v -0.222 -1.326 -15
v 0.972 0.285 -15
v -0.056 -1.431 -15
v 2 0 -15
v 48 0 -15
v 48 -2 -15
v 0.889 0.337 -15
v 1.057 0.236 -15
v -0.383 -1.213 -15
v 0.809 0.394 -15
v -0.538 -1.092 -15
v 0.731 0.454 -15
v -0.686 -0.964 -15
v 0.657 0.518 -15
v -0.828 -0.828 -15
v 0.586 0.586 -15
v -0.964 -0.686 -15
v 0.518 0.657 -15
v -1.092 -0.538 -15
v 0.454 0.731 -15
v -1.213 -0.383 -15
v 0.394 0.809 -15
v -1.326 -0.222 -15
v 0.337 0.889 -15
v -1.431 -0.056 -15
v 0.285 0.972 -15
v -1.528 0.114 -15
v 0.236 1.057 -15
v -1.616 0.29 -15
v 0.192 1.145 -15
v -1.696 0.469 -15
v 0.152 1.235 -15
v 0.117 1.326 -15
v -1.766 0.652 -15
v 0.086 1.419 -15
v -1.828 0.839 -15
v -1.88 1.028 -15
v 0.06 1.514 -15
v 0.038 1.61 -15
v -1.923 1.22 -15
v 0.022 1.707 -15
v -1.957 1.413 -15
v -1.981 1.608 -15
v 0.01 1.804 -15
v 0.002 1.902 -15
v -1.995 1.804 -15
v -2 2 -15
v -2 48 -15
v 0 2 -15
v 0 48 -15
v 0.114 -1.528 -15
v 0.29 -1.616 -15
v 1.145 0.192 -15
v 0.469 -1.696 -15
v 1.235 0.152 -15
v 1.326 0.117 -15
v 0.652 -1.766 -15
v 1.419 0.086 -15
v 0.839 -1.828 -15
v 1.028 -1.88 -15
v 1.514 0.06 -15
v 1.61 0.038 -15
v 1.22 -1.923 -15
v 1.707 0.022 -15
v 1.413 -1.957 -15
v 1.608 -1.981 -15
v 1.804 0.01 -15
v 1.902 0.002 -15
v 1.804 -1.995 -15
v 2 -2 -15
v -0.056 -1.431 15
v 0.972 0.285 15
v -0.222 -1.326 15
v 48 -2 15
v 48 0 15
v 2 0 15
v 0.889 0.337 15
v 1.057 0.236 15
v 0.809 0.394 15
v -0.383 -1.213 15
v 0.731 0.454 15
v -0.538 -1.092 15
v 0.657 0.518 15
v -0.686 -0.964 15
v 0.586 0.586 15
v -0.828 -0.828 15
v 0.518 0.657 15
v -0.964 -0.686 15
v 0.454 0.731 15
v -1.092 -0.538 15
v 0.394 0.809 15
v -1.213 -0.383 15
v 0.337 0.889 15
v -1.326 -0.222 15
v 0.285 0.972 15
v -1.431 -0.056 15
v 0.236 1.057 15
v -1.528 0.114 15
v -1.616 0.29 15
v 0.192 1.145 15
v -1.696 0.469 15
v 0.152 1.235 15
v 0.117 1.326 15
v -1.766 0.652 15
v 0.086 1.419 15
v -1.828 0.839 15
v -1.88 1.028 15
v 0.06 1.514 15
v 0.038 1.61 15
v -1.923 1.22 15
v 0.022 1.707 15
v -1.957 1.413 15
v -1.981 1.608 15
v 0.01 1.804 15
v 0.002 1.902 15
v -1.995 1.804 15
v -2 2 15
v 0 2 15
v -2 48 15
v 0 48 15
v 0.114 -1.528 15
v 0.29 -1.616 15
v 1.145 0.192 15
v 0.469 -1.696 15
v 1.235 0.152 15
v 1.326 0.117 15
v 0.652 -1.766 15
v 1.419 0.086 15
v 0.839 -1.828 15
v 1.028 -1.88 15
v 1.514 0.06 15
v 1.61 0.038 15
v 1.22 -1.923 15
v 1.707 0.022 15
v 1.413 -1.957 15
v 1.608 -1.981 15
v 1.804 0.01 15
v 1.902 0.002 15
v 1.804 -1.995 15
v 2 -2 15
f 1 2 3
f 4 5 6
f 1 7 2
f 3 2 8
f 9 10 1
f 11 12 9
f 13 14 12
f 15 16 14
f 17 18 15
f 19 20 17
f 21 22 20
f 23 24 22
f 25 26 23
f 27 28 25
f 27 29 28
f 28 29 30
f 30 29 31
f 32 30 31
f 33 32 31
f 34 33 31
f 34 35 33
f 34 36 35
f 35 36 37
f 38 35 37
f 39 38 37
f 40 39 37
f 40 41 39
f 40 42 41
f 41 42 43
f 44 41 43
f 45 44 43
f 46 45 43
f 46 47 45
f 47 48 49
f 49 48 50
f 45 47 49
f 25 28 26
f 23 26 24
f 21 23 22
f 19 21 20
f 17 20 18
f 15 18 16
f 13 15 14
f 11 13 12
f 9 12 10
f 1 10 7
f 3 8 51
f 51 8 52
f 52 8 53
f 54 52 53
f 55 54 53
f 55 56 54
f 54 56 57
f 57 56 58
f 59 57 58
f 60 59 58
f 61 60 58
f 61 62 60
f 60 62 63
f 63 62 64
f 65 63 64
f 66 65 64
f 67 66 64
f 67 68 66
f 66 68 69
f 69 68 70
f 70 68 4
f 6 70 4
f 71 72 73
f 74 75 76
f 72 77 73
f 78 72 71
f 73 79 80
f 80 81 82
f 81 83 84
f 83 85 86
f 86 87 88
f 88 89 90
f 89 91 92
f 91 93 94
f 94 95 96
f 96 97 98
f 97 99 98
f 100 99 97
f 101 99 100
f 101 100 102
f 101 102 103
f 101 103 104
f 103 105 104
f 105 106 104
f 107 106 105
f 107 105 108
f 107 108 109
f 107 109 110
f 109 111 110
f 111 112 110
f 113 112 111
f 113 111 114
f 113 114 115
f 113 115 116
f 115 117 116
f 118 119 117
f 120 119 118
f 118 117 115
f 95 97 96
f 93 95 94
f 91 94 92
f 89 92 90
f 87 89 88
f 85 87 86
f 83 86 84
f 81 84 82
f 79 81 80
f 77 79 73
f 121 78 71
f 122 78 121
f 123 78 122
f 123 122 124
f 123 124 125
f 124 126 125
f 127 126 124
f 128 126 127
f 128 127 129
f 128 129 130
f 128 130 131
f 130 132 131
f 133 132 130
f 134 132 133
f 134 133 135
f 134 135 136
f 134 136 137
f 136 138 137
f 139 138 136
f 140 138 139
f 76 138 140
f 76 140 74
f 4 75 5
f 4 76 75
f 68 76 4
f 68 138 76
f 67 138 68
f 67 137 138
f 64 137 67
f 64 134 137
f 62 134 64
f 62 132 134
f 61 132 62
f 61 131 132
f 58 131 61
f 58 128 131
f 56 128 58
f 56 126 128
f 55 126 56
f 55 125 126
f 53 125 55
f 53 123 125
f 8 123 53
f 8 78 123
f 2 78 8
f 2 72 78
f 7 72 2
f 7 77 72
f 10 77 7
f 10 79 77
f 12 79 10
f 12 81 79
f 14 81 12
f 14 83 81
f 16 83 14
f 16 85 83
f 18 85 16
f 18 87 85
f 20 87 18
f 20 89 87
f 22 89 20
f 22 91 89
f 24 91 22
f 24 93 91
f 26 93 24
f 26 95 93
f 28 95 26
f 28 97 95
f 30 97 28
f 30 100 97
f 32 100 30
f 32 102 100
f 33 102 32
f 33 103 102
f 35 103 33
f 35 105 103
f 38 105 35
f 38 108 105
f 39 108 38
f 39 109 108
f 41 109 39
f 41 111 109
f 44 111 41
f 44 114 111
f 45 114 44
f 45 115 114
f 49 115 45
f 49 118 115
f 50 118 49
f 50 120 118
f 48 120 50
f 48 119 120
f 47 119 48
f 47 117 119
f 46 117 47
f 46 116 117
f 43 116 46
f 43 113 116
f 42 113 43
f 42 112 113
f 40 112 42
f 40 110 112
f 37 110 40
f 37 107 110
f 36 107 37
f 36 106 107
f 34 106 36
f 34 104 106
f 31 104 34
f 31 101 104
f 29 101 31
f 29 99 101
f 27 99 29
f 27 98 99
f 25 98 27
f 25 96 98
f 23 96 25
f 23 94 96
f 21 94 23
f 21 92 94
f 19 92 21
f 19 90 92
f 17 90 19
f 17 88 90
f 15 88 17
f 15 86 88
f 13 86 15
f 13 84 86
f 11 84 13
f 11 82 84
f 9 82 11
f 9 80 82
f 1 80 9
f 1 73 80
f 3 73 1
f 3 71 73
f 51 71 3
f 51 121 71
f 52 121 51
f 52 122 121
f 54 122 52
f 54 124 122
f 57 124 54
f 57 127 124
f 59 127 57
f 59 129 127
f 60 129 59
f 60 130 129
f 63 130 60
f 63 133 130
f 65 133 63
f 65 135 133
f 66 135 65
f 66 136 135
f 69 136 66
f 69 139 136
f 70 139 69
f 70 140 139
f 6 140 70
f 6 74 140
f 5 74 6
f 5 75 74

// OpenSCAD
// Parametric Sheet-Metal L-Bracket Design
// Designed for manufacturing (DFM) with precise bend allowance calculation.

// --- Design Parameters ---
thickness = 2.0;          // mm, sheet metal thickness (T)
inside_radius = 2.0;      // mm, inside bend radius (R_i)
flange_1_outside = 50.0;  // mm, outside length of flange 1 (L_1)
flange_2_outside = 50.0;  // mm, outside length of flange 2 (L_2)
bracket_width = 30.0;     // mm, bracket width (W)
k_factor = 0.45;          // K-factor for medium steel / air bending
$fn = 128;                // Smoothness of bend arcs

// --- Flat Pattern Calculations (Bend Allowance) ---
outside_radius = inside_radius + thickness;

// Straight flat portions (excluding the bend region)
flat_1 = flange_1_outside - outside_radius;
flat_2 = flange_2_outside - outside_radius;

// Bend Angle (90 degrees for L-bracket)
bend_angle = 90.0;

// Bend Allowance (BA) Formula:
// BA = angle_rad * (R_i + K * T)
bend_allowance = (bend_angle * PI / 180.0) * (inside_radius + k_factor * thickness);

// Total developed flat-pattern length
flat_length = flat_1 + flat_2 + bend_allowance;

// Echo the required manifest line for downstream integration
echo(str("MAKERBENCH-SHEETMETAL: {\"thickness_mm\": ", thickness, ", \"bend_radius_mm\": ", inside_radius, ", \"flat_length_mm\": ", flat_length, "}"));

// --- 2D Profile Module ---
module bracket_profile() {
    num_segments = $fn / 4; // 1/4 of a circle for a 90-degree bend
    
    // Inside bend fillet arc: centered at (R_i, R_i) going from 270 down to 180 deg
    inside_arc = [
        for (i = [0 : num_segments])
        let(angle = 270 - i * (90 / num_segments))
        [ inside_radius + inside_radius * cos(angle), inside_radius + inside_radius * sin(angle) ]
    ];
    
    // Outside bend fillet arc: centered at (R_i, R_i) going from 180 up to 270 deg
    outside_arc = [
        for (i = [0 : num_segments])
        let(angle = 180 + i * (90 / num_segments))
        [ inside_radius + outside_radius * cos(angle), inside_radius + outside_radius * sin(angle) ]
    ];
    
    // Construct the continuous counter-clockwise polygon loop
    points = concat(
        // Flange 1 inside straight end to inside bend start
        [[flange_1_outside - thickness, 0]],
        
        // Inside bend arc
        inside_arc,
        
        // Flange 2 inside bend end to inside straight end
        [[0, flange_2_outside - thickness]],
        
        // Flange 2 end face thickness segment
        [[-thickness, flange_2_outside - thickness]],
        
        // Outside bend arc
        outside_arc,
        
        // Flange 1 outside straight end to outside end face thickness segment
        [[flange_1_outside - thickness, -thickness]]
    );
    
    polygon(points);
}

// --- 3D Solid Generation ---
linear_extrude(height = bracket_width, center = true) {
    bracket_profile();
}
